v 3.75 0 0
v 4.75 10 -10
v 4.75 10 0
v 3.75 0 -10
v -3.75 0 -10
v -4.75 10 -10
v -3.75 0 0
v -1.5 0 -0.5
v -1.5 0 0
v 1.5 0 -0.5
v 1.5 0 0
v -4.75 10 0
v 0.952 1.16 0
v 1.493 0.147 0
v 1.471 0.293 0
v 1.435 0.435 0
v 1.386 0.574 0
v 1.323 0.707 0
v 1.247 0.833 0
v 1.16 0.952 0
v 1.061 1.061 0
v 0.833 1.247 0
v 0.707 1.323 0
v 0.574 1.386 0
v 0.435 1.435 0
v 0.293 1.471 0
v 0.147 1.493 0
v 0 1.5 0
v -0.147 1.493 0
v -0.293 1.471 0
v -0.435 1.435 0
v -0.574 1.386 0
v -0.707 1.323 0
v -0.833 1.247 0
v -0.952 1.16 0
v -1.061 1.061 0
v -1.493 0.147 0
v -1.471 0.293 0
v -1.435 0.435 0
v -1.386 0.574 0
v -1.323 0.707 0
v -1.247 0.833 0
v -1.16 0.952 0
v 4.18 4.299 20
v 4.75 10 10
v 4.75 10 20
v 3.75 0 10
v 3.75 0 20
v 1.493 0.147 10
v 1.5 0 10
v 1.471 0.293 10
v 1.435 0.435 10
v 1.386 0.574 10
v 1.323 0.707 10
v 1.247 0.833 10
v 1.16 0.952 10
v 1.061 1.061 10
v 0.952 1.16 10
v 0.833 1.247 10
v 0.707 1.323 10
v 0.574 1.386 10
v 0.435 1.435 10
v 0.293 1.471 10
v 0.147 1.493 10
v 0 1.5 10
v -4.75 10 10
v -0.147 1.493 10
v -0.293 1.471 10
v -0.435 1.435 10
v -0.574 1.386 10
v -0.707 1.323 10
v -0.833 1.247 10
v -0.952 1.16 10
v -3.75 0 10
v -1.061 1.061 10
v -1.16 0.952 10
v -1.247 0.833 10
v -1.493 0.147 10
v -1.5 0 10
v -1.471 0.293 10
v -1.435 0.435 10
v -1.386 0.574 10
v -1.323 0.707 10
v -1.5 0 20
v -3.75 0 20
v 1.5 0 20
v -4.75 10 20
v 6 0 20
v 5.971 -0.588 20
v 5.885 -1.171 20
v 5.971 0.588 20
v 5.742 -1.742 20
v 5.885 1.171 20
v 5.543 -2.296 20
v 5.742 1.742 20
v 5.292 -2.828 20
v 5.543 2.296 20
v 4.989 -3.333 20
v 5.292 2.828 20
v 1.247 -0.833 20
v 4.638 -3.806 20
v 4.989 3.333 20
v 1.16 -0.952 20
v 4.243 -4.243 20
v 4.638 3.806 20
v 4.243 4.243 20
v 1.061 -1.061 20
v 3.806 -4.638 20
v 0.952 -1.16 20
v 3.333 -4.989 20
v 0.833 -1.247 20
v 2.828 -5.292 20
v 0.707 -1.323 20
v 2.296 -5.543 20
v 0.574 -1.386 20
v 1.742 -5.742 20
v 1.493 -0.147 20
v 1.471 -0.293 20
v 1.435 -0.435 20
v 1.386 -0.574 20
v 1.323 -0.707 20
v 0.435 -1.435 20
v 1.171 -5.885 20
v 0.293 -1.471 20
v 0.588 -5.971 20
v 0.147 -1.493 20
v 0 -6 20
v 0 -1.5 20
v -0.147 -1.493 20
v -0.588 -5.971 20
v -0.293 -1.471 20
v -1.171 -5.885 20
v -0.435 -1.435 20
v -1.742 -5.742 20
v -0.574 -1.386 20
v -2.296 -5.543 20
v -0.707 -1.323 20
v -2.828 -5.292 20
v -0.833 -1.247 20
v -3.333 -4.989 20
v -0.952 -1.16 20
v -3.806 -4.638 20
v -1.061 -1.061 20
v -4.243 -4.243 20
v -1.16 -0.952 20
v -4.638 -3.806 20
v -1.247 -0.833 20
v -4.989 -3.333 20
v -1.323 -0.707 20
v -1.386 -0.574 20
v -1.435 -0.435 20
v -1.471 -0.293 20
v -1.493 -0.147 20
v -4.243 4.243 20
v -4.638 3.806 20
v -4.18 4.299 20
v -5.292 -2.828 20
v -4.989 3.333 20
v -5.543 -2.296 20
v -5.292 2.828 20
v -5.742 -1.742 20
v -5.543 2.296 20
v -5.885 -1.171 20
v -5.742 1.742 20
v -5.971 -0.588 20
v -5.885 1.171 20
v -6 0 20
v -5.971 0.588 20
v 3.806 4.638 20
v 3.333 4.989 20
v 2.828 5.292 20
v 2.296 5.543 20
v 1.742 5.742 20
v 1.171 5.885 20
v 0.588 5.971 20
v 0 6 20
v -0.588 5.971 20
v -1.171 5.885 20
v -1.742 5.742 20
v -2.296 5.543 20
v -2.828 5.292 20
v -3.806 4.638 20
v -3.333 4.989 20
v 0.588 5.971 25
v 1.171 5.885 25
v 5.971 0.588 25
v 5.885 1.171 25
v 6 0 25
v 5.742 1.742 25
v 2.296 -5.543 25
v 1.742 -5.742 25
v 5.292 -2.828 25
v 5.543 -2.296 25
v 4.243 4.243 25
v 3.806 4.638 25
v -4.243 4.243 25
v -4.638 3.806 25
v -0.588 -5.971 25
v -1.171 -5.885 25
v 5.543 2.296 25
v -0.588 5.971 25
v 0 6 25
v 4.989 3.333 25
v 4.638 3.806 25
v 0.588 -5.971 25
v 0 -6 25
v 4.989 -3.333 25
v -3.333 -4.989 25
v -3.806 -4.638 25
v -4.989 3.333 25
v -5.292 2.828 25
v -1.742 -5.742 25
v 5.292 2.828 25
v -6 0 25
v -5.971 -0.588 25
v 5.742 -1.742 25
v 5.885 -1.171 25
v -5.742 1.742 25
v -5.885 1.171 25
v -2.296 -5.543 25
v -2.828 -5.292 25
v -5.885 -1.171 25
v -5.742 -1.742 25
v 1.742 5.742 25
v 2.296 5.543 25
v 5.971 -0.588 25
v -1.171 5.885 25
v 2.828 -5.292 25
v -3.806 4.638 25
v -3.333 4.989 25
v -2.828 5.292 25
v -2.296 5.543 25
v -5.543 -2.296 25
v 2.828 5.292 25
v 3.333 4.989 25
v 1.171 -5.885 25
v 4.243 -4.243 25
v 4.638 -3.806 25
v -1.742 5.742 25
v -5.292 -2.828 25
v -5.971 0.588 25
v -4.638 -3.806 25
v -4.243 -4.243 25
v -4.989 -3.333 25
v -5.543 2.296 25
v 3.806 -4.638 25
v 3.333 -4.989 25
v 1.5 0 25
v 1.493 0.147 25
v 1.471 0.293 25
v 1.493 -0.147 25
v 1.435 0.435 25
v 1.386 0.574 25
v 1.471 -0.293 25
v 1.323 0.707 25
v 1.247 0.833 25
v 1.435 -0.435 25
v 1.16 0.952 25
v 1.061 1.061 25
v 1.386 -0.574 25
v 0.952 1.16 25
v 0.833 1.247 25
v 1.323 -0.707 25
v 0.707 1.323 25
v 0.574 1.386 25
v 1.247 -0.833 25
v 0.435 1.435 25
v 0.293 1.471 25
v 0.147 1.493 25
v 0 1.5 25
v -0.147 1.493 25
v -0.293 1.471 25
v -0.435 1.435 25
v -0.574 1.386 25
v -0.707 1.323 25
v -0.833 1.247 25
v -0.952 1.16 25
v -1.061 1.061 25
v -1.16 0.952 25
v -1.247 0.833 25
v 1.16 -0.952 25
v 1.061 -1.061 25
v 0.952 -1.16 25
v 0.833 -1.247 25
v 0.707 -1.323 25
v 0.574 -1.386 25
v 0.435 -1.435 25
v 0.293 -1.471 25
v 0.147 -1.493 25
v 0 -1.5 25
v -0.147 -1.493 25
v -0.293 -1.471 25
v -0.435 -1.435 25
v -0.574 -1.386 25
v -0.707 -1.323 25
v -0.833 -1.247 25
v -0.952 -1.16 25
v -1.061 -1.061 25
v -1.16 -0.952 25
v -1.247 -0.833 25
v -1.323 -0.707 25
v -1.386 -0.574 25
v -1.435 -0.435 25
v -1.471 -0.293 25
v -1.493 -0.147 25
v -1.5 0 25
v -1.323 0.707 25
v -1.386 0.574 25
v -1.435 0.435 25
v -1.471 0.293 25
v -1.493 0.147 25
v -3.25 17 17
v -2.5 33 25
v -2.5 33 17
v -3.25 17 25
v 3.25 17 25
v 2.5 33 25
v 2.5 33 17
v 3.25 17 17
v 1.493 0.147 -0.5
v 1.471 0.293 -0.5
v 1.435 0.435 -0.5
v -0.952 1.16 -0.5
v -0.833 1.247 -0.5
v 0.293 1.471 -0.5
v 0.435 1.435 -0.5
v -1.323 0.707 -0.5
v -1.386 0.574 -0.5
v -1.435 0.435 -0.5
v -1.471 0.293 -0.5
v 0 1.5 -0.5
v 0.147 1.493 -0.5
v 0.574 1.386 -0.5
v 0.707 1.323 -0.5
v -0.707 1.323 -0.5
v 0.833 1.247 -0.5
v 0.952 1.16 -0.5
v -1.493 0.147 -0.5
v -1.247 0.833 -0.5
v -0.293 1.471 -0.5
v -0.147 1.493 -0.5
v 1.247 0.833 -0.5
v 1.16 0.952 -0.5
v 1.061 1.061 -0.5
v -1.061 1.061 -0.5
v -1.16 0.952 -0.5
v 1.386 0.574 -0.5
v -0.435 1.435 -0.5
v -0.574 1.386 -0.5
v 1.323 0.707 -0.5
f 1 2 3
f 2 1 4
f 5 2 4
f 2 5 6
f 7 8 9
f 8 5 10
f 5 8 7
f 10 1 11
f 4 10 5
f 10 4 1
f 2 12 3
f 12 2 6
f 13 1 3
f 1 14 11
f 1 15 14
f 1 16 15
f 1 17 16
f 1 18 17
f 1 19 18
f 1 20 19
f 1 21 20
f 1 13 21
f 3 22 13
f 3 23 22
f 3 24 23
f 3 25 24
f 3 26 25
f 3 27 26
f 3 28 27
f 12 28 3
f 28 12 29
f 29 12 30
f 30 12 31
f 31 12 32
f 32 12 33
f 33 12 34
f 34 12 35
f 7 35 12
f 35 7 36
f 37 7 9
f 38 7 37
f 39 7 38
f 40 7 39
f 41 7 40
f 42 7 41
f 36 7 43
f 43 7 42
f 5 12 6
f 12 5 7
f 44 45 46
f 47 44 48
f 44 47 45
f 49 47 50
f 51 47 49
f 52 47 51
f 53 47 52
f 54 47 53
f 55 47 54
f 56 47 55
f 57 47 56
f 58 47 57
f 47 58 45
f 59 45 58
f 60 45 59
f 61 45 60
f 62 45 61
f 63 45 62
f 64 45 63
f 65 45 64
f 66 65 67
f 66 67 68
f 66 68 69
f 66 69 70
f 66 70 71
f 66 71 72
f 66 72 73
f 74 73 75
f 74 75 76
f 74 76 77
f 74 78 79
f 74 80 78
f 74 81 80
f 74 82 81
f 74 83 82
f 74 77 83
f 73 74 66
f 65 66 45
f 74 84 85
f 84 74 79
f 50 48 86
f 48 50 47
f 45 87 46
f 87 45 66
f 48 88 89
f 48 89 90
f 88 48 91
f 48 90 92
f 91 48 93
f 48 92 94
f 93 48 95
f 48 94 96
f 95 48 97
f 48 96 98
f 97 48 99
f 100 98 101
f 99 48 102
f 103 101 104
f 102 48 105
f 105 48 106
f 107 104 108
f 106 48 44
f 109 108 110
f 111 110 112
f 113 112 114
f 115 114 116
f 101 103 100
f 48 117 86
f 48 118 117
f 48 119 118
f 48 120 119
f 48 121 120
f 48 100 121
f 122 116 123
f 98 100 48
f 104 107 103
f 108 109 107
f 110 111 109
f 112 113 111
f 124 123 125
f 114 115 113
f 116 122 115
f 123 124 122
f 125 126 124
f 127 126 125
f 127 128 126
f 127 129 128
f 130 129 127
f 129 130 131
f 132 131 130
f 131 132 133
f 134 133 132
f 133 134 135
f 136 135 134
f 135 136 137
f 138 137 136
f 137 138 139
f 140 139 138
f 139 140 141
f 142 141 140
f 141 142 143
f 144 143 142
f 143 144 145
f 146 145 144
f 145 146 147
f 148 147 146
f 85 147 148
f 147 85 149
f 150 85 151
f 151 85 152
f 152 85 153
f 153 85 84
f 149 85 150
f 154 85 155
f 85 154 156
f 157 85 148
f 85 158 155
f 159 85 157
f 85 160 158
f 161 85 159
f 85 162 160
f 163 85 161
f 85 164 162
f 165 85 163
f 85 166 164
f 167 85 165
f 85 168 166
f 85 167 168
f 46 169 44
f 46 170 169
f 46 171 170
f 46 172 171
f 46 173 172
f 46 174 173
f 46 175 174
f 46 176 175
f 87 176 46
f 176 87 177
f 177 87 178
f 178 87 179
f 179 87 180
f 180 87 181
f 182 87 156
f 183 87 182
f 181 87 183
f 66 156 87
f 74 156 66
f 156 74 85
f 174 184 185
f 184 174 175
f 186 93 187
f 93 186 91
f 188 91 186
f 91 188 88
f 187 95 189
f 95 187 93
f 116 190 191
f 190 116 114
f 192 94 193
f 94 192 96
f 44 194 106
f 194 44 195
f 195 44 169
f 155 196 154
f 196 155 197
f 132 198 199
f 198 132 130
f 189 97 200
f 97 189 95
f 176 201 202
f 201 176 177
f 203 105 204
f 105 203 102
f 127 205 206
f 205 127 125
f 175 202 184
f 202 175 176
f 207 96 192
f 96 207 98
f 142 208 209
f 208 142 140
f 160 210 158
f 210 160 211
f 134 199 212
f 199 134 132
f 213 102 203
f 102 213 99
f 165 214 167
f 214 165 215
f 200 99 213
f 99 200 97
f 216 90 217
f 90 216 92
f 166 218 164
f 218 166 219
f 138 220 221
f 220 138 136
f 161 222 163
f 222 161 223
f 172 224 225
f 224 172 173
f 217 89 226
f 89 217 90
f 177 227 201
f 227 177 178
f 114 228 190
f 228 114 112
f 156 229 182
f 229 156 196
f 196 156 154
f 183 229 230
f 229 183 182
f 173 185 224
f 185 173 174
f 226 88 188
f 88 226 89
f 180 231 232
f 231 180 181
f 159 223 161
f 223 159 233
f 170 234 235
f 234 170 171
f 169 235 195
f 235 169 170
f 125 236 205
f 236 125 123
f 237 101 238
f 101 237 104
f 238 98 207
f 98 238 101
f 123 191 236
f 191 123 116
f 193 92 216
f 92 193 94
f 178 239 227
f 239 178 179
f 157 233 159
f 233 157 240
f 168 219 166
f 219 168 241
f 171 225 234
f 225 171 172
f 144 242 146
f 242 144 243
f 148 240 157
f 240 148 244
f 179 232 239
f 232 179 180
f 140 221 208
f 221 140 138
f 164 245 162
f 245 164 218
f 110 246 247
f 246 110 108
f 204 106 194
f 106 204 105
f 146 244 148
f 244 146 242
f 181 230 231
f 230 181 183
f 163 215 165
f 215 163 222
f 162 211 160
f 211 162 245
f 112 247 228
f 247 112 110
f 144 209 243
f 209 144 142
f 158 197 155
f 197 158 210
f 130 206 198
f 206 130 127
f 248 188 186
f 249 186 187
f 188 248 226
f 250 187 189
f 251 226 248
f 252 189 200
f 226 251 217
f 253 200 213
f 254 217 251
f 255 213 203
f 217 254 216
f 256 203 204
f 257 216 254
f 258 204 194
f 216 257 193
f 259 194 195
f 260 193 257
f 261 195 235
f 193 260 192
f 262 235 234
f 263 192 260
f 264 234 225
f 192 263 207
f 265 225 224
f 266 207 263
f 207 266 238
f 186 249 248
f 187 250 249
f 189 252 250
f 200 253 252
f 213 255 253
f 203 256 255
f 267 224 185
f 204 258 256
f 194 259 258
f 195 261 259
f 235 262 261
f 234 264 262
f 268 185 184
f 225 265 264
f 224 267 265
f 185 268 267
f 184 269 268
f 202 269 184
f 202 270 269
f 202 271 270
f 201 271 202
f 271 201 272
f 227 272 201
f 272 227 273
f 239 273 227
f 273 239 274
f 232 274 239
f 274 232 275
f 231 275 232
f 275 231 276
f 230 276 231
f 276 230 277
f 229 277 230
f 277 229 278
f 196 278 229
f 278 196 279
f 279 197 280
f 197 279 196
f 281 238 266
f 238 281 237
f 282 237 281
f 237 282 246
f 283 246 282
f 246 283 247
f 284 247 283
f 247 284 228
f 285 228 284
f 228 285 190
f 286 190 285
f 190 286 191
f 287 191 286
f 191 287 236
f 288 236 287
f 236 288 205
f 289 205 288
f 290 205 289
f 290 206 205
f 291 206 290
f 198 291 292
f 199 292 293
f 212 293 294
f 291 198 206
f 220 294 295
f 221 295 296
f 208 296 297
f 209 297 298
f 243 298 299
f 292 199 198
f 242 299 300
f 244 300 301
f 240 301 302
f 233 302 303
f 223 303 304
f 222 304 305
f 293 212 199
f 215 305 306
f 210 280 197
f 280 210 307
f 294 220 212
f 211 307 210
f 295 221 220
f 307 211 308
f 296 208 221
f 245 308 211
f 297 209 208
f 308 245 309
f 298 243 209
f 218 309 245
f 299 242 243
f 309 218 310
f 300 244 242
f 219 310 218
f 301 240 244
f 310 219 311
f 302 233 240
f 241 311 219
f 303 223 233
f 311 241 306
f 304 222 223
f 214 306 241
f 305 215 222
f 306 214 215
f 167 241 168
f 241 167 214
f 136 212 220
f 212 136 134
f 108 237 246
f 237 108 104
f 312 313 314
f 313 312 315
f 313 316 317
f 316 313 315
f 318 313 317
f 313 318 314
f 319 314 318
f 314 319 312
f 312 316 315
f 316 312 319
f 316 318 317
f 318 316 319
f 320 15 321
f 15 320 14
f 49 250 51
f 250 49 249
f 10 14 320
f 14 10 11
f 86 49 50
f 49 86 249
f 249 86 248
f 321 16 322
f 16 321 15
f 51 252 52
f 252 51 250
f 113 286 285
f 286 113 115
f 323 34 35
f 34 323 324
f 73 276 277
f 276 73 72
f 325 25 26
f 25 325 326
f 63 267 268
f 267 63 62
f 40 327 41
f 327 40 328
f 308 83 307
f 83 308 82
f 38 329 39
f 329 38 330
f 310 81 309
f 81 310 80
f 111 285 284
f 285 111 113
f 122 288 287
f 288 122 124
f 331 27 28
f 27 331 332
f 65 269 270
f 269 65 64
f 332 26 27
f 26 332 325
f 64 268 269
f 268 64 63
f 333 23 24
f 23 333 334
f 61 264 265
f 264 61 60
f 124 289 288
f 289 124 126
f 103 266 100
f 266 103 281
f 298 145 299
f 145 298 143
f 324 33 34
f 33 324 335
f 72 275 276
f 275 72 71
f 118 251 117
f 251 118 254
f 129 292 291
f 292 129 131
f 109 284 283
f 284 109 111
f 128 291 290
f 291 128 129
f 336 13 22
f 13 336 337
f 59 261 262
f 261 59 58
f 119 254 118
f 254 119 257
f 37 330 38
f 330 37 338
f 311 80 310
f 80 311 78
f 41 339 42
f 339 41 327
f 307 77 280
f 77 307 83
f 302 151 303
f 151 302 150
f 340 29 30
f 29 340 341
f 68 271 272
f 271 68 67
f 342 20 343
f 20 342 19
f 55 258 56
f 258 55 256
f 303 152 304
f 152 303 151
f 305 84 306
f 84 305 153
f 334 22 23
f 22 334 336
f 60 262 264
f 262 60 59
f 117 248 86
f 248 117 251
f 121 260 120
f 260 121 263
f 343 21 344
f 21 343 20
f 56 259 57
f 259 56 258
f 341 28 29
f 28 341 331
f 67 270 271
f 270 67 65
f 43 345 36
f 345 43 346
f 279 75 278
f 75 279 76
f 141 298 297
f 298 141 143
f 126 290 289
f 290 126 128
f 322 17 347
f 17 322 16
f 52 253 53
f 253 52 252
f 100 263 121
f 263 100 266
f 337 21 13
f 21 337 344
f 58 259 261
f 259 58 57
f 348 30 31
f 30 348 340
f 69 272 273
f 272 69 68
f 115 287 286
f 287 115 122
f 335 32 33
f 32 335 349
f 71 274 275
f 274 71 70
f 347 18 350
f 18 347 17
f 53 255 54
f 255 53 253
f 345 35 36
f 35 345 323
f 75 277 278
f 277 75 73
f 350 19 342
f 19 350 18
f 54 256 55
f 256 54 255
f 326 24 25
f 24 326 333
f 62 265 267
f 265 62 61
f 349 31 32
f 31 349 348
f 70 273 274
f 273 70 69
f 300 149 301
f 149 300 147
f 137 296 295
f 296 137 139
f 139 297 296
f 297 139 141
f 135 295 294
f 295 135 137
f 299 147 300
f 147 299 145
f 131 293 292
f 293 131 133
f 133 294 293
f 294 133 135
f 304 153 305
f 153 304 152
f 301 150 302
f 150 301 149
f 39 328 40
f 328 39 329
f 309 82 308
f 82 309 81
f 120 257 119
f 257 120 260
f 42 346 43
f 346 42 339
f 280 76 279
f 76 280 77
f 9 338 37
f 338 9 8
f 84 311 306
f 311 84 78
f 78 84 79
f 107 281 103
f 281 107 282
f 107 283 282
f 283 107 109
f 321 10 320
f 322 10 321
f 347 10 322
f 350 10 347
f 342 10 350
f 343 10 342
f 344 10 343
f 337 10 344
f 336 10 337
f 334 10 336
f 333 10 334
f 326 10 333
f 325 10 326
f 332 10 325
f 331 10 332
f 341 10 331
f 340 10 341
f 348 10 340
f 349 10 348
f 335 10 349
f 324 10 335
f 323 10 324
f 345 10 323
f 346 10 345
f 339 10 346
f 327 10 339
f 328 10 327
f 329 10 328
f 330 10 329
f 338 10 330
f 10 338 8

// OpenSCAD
// Hose-barb reducer: 8 mm ID -> 5 mm ID
// Print orientation: standing upright along +Z

$fn = 64;

// ---- Dimensions (mm) ----
bore        = 3;     // through-bore diameter
tube_id1    = 8;     // larger tubing inner diameter
tube_id2    = 5;     // smaller tubing inner diameter
barb_h1     = 10;    // height of each 8 mm barb
barb_od1_b  = 7.5;   // outer diameter of 8 mm barb at bottom
barb_od1_t  = 9.5;   // outer diameter of 8 mm barb at top
collar_d    = 12;    // collar diameter (z = 20 to 25)
barb_h2     = 8;     // height of each 5 mm barb
barb_od2_b  = 6.5;   // outer diameter of 5 mm barb at bottom
barb_od2_t  = 5.0;   // outer diameter of 5 mm barb at top
total_h     = 41;    // overall height

eps = 0.5;           // cutter overshoot

// ---- Derived ----
z0 = 0;
z1 = barb_h1;        // top of first 8 mm barb
z2 = z1 + barb_h1;   // top of second 8 mm barb / bottom of collar
z3 = z2 + 5;         // top of collar
z4 = z3 + barb_h2;   // top of first 5 mm barb
z5 = z4 + barb_h2;   // top of second 5 mm barb (= total_h)

// ---- Model ----
difference() {
    union() {
        // 8 mm tubing barbs (sawtooth profile)
        for (i = [-1, 1])
            translate([0, 0, z0 + i * barb_h1])
                linear_extrude(height = barb_h1)
                    polygon([
                        [-barb_od1_b / 2, z0],
                        [ barb_od1_b / 2, z0],
                        [ barb_od1_t / 2, z1],
                        [-barb_od1_t / 2, z1]
                    ]);

        // Collar
        translate([0, 0, z2])
            cylinder(d = collar_d, h = 5);

        // 5 mm tubing barbs (sawtooth profile)
        for (i = [-1, 1])
            translate([0, 0, z3 + i * barb_h2])
                linear_extrude(height = barb_h2)
                    polygon([
                        [-barb_od2_b / 2, z3 + i * barb_h2],
                        [ barb_od2_b / 2, z3 + i * barb_h2],
                        [ barb_od2_t / 2, z5 - barb_h2],
                        [-barb_od2_t / 2, z5 - barb_h2]
                    ]);
    }

    // Through-bore
    translate([0, 0, -eps])
        cylinder(d = bore, h = total_h + 2 * eps);
}
